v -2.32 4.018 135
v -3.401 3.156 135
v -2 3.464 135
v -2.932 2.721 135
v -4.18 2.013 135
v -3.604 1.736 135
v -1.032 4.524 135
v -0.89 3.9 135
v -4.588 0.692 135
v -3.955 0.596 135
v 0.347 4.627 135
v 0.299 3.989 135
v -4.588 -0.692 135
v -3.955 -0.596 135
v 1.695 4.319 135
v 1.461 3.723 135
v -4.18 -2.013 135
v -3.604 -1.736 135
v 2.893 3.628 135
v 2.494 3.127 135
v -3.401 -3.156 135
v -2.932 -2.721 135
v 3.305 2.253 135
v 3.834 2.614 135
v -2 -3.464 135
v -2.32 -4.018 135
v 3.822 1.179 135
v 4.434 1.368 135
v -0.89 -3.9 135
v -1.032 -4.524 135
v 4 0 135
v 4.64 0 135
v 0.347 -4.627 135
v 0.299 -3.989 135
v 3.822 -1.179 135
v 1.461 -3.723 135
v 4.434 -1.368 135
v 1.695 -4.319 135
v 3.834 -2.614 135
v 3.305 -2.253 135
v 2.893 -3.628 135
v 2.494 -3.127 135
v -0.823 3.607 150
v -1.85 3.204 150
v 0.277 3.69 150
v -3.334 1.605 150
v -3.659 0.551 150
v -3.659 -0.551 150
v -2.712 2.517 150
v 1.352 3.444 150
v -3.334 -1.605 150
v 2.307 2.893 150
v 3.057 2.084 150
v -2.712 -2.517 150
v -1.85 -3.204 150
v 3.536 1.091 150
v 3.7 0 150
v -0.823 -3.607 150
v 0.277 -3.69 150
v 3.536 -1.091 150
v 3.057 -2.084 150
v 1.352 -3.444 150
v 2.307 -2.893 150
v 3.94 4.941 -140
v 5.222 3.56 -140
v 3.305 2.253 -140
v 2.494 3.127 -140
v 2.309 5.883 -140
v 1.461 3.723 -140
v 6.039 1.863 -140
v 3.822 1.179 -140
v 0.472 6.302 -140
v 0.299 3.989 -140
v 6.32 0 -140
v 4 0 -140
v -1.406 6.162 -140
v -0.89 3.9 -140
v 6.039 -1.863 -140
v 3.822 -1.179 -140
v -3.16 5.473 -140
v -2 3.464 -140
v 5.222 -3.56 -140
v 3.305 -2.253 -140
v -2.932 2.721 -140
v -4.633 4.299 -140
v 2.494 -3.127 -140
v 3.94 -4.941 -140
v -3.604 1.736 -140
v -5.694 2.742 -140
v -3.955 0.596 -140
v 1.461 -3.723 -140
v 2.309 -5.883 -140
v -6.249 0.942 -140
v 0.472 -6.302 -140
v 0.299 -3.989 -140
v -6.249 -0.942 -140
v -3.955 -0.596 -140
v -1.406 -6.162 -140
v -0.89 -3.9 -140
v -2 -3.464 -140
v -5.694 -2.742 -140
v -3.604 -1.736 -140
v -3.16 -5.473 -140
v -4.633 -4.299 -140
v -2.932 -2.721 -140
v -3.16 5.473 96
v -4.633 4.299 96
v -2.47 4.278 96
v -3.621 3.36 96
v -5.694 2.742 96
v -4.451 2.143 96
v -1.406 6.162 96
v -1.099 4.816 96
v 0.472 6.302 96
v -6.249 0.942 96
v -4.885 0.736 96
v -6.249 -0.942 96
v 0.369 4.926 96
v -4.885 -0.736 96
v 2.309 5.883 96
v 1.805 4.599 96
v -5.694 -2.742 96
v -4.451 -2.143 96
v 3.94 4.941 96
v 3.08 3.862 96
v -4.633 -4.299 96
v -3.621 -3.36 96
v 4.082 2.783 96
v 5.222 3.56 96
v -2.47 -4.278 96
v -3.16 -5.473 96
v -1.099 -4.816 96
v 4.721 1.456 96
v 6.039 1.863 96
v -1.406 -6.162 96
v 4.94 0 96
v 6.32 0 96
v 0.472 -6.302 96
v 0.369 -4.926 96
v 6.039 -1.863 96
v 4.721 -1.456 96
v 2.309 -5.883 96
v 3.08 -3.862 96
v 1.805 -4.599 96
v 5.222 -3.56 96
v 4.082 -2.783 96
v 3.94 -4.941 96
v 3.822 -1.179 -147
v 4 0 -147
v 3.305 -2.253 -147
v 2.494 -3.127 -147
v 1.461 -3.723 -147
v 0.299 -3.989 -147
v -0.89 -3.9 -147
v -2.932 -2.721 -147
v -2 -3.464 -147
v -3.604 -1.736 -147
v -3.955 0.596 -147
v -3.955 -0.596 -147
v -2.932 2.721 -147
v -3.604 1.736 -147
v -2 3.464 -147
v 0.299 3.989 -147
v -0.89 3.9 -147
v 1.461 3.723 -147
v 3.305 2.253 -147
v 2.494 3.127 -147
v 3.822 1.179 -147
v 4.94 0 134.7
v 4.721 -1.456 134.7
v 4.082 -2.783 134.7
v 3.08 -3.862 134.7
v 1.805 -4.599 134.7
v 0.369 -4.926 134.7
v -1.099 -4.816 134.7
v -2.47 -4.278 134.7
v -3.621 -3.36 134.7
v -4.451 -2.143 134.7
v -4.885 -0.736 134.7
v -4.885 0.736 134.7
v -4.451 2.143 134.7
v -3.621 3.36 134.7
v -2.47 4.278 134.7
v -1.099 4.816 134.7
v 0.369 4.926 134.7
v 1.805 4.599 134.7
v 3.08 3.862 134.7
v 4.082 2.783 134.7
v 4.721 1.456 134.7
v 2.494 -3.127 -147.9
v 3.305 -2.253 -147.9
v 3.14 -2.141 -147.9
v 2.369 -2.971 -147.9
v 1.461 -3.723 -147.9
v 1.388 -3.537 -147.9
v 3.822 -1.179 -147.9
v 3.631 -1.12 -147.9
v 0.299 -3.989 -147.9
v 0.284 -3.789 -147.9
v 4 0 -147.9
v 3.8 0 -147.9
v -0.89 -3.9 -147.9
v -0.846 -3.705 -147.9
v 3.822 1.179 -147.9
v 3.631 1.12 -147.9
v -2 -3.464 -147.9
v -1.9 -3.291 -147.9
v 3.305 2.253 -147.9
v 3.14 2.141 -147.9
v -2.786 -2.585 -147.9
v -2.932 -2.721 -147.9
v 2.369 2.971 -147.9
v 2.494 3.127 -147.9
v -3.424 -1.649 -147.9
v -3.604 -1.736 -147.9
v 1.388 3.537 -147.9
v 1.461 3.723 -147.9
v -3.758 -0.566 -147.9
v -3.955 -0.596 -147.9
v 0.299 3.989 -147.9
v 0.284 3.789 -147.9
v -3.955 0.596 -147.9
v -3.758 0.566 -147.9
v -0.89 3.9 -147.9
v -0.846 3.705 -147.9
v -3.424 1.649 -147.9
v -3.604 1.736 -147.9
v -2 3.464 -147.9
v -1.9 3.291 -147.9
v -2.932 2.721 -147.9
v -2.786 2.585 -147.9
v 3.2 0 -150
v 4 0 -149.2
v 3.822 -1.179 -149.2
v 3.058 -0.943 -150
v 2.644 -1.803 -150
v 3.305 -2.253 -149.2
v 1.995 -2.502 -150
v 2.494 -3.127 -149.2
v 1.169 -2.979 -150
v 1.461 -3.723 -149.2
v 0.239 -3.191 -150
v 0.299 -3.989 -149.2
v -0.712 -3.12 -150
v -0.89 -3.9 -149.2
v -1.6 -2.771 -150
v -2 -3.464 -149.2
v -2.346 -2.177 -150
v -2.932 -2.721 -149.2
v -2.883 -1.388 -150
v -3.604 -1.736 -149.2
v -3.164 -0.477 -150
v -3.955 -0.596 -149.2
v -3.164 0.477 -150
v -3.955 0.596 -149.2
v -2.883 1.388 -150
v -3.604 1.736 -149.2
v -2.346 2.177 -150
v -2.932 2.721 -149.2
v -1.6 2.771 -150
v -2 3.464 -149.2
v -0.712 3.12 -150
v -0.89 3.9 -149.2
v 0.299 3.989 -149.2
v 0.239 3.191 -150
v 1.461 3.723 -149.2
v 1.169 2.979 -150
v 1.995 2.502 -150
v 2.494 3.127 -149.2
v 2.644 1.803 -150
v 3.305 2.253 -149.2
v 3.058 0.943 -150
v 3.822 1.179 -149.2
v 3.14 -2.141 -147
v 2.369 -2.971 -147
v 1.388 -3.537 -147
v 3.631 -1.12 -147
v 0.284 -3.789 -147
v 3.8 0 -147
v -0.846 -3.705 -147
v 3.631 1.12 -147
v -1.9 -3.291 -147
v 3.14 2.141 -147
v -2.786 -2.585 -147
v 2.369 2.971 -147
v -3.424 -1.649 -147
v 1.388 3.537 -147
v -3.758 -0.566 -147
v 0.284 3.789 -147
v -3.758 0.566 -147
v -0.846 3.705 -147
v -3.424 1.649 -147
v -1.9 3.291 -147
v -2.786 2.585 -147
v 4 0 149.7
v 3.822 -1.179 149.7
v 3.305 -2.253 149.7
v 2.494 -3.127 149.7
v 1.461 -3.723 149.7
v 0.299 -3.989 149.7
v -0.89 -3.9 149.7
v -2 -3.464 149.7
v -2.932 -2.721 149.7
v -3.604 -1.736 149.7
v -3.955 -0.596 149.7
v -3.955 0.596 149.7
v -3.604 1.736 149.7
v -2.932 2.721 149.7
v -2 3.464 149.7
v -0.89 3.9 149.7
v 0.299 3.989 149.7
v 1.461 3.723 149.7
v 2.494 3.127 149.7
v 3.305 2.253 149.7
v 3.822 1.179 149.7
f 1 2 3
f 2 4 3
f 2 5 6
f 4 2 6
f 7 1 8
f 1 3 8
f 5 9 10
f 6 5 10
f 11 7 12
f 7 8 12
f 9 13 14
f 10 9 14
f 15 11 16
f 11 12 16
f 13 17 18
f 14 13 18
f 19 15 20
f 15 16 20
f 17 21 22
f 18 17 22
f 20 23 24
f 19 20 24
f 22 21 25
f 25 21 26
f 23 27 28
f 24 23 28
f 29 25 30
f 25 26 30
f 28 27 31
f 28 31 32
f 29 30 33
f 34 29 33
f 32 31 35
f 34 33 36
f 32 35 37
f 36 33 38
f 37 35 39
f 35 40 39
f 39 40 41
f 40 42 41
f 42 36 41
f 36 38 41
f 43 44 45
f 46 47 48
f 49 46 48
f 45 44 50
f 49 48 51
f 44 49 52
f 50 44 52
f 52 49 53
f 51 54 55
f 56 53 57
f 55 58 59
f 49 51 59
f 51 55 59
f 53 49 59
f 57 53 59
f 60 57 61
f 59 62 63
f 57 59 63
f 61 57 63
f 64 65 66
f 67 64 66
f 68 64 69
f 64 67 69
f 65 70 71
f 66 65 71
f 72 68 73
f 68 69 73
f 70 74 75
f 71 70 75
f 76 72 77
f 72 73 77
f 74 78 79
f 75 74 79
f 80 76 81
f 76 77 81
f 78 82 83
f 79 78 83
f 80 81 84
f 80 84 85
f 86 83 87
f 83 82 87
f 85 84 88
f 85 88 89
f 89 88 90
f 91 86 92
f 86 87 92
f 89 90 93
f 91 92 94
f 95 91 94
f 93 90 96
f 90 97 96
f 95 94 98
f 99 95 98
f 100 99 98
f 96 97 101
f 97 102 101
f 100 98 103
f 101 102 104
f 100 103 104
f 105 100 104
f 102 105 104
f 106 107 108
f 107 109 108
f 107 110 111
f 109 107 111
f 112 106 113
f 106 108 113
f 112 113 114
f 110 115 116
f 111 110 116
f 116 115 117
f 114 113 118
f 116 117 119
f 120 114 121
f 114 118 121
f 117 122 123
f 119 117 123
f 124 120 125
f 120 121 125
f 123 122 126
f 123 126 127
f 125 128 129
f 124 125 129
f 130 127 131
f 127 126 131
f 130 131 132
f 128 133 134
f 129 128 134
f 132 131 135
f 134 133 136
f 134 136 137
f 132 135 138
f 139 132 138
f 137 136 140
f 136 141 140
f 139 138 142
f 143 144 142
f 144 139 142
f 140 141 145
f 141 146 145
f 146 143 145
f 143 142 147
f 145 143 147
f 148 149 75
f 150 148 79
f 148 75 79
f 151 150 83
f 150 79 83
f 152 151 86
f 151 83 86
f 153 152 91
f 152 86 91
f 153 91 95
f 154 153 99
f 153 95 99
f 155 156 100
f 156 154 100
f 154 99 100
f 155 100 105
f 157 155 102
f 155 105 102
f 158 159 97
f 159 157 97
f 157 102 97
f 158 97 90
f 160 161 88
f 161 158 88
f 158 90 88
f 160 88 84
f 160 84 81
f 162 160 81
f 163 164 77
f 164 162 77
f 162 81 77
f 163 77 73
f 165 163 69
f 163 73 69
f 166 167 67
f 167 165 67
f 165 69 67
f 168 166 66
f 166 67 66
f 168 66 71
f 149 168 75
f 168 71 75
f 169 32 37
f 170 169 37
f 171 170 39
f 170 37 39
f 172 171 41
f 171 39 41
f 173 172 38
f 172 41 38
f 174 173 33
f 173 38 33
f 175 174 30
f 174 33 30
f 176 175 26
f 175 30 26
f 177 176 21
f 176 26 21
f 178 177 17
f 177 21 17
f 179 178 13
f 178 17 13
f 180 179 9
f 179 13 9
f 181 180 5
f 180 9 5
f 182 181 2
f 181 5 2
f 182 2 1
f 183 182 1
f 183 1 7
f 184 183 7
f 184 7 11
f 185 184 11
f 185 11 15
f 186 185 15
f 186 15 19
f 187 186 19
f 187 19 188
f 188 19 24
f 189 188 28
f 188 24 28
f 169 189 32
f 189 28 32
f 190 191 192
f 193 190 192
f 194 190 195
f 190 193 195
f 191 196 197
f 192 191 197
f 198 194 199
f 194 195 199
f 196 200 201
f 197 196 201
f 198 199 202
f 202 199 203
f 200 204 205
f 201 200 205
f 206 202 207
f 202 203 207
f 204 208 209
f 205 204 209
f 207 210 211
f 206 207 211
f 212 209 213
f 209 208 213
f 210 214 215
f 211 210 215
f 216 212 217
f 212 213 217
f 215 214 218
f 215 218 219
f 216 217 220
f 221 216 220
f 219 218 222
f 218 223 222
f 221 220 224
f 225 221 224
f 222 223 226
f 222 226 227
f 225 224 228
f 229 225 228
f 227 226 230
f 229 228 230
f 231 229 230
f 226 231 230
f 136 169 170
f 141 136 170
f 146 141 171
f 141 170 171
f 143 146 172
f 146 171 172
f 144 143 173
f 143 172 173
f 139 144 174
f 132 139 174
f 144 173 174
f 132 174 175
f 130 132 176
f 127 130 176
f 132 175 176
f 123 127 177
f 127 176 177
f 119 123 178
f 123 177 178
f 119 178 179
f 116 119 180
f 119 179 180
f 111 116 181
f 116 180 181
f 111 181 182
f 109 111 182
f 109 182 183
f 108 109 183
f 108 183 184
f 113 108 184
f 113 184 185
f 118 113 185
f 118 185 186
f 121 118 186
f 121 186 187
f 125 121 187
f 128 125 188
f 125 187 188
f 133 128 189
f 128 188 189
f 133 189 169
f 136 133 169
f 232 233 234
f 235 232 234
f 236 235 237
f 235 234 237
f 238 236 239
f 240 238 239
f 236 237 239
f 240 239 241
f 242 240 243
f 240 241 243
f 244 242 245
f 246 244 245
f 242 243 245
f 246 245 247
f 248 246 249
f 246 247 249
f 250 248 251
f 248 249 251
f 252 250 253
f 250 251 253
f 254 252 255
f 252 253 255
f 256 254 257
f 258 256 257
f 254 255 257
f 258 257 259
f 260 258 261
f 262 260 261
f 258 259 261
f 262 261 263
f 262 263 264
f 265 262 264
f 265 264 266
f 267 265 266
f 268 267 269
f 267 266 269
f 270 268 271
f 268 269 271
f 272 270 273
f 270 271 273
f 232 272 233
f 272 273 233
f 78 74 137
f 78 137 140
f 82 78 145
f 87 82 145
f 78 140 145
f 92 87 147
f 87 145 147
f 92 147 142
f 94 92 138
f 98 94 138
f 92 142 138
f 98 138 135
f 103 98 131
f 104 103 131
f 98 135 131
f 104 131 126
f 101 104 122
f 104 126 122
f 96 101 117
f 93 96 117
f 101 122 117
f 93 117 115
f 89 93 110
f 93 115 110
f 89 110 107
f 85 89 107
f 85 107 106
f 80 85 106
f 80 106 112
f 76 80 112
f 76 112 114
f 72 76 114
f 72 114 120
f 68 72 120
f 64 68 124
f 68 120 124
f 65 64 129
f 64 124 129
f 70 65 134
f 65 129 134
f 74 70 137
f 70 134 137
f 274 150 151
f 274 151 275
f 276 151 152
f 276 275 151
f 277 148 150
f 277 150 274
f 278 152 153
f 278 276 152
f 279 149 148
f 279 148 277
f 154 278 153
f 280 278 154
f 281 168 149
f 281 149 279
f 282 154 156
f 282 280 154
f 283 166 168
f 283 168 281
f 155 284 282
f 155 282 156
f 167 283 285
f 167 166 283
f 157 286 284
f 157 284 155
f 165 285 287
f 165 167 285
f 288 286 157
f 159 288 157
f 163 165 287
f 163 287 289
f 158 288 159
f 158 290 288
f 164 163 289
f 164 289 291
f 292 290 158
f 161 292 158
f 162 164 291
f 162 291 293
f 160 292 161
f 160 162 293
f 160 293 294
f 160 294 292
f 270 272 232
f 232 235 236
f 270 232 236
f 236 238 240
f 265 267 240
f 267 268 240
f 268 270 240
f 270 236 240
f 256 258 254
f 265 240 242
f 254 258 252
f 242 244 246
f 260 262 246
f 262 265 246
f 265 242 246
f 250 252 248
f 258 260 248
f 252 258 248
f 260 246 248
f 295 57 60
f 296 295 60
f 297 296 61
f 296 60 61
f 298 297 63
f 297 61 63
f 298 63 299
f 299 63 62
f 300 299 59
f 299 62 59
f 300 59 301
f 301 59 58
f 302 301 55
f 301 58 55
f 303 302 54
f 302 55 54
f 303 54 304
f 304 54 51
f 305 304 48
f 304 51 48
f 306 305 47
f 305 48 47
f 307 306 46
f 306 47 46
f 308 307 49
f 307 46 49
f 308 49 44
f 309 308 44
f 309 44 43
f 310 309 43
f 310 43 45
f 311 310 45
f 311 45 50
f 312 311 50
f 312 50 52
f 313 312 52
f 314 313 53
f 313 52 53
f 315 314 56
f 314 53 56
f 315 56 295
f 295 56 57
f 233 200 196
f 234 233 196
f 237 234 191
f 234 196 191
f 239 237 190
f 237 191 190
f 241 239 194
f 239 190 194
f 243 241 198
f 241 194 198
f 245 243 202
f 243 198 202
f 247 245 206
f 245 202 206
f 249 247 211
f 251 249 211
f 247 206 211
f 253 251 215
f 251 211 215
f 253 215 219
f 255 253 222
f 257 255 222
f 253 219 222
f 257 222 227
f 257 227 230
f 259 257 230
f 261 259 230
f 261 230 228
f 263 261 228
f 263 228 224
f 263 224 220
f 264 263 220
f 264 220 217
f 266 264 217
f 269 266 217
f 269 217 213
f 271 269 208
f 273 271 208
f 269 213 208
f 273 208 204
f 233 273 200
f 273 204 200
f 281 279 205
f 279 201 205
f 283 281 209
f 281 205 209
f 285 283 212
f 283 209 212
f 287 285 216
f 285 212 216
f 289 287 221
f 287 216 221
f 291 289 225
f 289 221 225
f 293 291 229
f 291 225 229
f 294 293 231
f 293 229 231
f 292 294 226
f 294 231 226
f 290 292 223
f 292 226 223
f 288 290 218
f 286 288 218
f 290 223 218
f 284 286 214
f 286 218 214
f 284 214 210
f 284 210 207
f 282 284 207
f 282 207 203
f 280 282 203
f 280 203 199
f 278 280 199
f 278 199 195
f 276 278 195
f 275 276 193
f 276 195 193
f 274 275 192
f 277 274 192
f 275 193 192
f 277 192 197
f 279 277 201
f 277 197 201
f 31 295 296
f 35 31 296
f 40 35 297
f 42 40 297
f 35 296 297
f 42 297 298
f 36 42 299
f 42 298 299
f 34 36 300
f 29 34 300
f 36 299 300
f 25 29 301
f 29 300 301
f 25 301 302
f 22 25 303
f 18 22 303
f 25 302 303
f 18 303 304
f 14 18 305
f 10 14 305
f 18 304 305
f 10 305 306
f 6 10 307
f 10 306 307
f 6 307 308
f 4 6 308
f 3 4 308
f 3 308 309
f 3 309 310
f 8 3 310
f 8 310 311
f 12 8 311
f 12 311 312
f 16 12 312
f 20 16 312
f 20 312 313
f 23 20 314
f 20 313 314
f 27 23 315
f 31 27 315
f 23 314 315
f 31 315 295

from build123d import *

# Parameters (mm, degrees)
SKETCH2_W     = 0.9
SKETCH2_H     = 0.2
CHAMFER1_SIZE = 0.8
CHAMFER2_SIZE = 0.3


with BuildPart() as part:
    # Sketch1 → Revolve1 (revolve)
    with BuildSketch(Plane(origin=(0, 0, 0), x_dir=(0, 0, -1), z_dir=(1, 0, 0)), mode=Mode.PRIVATE) as revolve1_sk:
        Polygon((-150, 0), (150, 0), (150, 4), (140, 4), (140, 6.32), (-96, 6.32), (-96, 4.94), (-135, 4.94), (-135, 4), (-150, 4), align=None)
    revolve(revolve1_sk.sketch.rotate(Axis((0, 0, 150), (0, 0, -1)), 90), axis=Axis((0, 0, 150), (0, 0, -1)))

    # Sketch2 → Cut-Revolve1 (revolve, cut)
    with BuildSketch(Plane(origin=(0, 0, 0), x_dir=(0, 0, -1), z_dir=(1, 0, 0)), mode=Mode.PRIVATE) as cut_revolve1_sk:
        with Locations((147.45, 3.9)):
            Rectangle(SKETCH2_W, SKETCH2_H)
    revolve(cut_revolve1_sk.sketch.rotate(Axis((0, 0, -150), (0, 0, 1)), 270), axis=Axis((0, 0, -150), (0, 0, 1)), mode=Mode.SUBTRACT)

    # Chamfer1
    chamfer1_edges = [part.edges().sort_by_distance(p)[0] for p in [
        (-4, 0, -150),
    ]]
    chamfer(chamfer1_edges, length=CHAMFER1_SIZE)

    # Chamfer2
    chamfer2_edges = [part.edges().sort_by_distance(p)[0] for p in [
        (-4.94, 0, 135),
        (-4, 0, 150),
    ]]
    chamfer(chamfer2_edges, length=CHAMFER2_SIZE)


solid = part.part
